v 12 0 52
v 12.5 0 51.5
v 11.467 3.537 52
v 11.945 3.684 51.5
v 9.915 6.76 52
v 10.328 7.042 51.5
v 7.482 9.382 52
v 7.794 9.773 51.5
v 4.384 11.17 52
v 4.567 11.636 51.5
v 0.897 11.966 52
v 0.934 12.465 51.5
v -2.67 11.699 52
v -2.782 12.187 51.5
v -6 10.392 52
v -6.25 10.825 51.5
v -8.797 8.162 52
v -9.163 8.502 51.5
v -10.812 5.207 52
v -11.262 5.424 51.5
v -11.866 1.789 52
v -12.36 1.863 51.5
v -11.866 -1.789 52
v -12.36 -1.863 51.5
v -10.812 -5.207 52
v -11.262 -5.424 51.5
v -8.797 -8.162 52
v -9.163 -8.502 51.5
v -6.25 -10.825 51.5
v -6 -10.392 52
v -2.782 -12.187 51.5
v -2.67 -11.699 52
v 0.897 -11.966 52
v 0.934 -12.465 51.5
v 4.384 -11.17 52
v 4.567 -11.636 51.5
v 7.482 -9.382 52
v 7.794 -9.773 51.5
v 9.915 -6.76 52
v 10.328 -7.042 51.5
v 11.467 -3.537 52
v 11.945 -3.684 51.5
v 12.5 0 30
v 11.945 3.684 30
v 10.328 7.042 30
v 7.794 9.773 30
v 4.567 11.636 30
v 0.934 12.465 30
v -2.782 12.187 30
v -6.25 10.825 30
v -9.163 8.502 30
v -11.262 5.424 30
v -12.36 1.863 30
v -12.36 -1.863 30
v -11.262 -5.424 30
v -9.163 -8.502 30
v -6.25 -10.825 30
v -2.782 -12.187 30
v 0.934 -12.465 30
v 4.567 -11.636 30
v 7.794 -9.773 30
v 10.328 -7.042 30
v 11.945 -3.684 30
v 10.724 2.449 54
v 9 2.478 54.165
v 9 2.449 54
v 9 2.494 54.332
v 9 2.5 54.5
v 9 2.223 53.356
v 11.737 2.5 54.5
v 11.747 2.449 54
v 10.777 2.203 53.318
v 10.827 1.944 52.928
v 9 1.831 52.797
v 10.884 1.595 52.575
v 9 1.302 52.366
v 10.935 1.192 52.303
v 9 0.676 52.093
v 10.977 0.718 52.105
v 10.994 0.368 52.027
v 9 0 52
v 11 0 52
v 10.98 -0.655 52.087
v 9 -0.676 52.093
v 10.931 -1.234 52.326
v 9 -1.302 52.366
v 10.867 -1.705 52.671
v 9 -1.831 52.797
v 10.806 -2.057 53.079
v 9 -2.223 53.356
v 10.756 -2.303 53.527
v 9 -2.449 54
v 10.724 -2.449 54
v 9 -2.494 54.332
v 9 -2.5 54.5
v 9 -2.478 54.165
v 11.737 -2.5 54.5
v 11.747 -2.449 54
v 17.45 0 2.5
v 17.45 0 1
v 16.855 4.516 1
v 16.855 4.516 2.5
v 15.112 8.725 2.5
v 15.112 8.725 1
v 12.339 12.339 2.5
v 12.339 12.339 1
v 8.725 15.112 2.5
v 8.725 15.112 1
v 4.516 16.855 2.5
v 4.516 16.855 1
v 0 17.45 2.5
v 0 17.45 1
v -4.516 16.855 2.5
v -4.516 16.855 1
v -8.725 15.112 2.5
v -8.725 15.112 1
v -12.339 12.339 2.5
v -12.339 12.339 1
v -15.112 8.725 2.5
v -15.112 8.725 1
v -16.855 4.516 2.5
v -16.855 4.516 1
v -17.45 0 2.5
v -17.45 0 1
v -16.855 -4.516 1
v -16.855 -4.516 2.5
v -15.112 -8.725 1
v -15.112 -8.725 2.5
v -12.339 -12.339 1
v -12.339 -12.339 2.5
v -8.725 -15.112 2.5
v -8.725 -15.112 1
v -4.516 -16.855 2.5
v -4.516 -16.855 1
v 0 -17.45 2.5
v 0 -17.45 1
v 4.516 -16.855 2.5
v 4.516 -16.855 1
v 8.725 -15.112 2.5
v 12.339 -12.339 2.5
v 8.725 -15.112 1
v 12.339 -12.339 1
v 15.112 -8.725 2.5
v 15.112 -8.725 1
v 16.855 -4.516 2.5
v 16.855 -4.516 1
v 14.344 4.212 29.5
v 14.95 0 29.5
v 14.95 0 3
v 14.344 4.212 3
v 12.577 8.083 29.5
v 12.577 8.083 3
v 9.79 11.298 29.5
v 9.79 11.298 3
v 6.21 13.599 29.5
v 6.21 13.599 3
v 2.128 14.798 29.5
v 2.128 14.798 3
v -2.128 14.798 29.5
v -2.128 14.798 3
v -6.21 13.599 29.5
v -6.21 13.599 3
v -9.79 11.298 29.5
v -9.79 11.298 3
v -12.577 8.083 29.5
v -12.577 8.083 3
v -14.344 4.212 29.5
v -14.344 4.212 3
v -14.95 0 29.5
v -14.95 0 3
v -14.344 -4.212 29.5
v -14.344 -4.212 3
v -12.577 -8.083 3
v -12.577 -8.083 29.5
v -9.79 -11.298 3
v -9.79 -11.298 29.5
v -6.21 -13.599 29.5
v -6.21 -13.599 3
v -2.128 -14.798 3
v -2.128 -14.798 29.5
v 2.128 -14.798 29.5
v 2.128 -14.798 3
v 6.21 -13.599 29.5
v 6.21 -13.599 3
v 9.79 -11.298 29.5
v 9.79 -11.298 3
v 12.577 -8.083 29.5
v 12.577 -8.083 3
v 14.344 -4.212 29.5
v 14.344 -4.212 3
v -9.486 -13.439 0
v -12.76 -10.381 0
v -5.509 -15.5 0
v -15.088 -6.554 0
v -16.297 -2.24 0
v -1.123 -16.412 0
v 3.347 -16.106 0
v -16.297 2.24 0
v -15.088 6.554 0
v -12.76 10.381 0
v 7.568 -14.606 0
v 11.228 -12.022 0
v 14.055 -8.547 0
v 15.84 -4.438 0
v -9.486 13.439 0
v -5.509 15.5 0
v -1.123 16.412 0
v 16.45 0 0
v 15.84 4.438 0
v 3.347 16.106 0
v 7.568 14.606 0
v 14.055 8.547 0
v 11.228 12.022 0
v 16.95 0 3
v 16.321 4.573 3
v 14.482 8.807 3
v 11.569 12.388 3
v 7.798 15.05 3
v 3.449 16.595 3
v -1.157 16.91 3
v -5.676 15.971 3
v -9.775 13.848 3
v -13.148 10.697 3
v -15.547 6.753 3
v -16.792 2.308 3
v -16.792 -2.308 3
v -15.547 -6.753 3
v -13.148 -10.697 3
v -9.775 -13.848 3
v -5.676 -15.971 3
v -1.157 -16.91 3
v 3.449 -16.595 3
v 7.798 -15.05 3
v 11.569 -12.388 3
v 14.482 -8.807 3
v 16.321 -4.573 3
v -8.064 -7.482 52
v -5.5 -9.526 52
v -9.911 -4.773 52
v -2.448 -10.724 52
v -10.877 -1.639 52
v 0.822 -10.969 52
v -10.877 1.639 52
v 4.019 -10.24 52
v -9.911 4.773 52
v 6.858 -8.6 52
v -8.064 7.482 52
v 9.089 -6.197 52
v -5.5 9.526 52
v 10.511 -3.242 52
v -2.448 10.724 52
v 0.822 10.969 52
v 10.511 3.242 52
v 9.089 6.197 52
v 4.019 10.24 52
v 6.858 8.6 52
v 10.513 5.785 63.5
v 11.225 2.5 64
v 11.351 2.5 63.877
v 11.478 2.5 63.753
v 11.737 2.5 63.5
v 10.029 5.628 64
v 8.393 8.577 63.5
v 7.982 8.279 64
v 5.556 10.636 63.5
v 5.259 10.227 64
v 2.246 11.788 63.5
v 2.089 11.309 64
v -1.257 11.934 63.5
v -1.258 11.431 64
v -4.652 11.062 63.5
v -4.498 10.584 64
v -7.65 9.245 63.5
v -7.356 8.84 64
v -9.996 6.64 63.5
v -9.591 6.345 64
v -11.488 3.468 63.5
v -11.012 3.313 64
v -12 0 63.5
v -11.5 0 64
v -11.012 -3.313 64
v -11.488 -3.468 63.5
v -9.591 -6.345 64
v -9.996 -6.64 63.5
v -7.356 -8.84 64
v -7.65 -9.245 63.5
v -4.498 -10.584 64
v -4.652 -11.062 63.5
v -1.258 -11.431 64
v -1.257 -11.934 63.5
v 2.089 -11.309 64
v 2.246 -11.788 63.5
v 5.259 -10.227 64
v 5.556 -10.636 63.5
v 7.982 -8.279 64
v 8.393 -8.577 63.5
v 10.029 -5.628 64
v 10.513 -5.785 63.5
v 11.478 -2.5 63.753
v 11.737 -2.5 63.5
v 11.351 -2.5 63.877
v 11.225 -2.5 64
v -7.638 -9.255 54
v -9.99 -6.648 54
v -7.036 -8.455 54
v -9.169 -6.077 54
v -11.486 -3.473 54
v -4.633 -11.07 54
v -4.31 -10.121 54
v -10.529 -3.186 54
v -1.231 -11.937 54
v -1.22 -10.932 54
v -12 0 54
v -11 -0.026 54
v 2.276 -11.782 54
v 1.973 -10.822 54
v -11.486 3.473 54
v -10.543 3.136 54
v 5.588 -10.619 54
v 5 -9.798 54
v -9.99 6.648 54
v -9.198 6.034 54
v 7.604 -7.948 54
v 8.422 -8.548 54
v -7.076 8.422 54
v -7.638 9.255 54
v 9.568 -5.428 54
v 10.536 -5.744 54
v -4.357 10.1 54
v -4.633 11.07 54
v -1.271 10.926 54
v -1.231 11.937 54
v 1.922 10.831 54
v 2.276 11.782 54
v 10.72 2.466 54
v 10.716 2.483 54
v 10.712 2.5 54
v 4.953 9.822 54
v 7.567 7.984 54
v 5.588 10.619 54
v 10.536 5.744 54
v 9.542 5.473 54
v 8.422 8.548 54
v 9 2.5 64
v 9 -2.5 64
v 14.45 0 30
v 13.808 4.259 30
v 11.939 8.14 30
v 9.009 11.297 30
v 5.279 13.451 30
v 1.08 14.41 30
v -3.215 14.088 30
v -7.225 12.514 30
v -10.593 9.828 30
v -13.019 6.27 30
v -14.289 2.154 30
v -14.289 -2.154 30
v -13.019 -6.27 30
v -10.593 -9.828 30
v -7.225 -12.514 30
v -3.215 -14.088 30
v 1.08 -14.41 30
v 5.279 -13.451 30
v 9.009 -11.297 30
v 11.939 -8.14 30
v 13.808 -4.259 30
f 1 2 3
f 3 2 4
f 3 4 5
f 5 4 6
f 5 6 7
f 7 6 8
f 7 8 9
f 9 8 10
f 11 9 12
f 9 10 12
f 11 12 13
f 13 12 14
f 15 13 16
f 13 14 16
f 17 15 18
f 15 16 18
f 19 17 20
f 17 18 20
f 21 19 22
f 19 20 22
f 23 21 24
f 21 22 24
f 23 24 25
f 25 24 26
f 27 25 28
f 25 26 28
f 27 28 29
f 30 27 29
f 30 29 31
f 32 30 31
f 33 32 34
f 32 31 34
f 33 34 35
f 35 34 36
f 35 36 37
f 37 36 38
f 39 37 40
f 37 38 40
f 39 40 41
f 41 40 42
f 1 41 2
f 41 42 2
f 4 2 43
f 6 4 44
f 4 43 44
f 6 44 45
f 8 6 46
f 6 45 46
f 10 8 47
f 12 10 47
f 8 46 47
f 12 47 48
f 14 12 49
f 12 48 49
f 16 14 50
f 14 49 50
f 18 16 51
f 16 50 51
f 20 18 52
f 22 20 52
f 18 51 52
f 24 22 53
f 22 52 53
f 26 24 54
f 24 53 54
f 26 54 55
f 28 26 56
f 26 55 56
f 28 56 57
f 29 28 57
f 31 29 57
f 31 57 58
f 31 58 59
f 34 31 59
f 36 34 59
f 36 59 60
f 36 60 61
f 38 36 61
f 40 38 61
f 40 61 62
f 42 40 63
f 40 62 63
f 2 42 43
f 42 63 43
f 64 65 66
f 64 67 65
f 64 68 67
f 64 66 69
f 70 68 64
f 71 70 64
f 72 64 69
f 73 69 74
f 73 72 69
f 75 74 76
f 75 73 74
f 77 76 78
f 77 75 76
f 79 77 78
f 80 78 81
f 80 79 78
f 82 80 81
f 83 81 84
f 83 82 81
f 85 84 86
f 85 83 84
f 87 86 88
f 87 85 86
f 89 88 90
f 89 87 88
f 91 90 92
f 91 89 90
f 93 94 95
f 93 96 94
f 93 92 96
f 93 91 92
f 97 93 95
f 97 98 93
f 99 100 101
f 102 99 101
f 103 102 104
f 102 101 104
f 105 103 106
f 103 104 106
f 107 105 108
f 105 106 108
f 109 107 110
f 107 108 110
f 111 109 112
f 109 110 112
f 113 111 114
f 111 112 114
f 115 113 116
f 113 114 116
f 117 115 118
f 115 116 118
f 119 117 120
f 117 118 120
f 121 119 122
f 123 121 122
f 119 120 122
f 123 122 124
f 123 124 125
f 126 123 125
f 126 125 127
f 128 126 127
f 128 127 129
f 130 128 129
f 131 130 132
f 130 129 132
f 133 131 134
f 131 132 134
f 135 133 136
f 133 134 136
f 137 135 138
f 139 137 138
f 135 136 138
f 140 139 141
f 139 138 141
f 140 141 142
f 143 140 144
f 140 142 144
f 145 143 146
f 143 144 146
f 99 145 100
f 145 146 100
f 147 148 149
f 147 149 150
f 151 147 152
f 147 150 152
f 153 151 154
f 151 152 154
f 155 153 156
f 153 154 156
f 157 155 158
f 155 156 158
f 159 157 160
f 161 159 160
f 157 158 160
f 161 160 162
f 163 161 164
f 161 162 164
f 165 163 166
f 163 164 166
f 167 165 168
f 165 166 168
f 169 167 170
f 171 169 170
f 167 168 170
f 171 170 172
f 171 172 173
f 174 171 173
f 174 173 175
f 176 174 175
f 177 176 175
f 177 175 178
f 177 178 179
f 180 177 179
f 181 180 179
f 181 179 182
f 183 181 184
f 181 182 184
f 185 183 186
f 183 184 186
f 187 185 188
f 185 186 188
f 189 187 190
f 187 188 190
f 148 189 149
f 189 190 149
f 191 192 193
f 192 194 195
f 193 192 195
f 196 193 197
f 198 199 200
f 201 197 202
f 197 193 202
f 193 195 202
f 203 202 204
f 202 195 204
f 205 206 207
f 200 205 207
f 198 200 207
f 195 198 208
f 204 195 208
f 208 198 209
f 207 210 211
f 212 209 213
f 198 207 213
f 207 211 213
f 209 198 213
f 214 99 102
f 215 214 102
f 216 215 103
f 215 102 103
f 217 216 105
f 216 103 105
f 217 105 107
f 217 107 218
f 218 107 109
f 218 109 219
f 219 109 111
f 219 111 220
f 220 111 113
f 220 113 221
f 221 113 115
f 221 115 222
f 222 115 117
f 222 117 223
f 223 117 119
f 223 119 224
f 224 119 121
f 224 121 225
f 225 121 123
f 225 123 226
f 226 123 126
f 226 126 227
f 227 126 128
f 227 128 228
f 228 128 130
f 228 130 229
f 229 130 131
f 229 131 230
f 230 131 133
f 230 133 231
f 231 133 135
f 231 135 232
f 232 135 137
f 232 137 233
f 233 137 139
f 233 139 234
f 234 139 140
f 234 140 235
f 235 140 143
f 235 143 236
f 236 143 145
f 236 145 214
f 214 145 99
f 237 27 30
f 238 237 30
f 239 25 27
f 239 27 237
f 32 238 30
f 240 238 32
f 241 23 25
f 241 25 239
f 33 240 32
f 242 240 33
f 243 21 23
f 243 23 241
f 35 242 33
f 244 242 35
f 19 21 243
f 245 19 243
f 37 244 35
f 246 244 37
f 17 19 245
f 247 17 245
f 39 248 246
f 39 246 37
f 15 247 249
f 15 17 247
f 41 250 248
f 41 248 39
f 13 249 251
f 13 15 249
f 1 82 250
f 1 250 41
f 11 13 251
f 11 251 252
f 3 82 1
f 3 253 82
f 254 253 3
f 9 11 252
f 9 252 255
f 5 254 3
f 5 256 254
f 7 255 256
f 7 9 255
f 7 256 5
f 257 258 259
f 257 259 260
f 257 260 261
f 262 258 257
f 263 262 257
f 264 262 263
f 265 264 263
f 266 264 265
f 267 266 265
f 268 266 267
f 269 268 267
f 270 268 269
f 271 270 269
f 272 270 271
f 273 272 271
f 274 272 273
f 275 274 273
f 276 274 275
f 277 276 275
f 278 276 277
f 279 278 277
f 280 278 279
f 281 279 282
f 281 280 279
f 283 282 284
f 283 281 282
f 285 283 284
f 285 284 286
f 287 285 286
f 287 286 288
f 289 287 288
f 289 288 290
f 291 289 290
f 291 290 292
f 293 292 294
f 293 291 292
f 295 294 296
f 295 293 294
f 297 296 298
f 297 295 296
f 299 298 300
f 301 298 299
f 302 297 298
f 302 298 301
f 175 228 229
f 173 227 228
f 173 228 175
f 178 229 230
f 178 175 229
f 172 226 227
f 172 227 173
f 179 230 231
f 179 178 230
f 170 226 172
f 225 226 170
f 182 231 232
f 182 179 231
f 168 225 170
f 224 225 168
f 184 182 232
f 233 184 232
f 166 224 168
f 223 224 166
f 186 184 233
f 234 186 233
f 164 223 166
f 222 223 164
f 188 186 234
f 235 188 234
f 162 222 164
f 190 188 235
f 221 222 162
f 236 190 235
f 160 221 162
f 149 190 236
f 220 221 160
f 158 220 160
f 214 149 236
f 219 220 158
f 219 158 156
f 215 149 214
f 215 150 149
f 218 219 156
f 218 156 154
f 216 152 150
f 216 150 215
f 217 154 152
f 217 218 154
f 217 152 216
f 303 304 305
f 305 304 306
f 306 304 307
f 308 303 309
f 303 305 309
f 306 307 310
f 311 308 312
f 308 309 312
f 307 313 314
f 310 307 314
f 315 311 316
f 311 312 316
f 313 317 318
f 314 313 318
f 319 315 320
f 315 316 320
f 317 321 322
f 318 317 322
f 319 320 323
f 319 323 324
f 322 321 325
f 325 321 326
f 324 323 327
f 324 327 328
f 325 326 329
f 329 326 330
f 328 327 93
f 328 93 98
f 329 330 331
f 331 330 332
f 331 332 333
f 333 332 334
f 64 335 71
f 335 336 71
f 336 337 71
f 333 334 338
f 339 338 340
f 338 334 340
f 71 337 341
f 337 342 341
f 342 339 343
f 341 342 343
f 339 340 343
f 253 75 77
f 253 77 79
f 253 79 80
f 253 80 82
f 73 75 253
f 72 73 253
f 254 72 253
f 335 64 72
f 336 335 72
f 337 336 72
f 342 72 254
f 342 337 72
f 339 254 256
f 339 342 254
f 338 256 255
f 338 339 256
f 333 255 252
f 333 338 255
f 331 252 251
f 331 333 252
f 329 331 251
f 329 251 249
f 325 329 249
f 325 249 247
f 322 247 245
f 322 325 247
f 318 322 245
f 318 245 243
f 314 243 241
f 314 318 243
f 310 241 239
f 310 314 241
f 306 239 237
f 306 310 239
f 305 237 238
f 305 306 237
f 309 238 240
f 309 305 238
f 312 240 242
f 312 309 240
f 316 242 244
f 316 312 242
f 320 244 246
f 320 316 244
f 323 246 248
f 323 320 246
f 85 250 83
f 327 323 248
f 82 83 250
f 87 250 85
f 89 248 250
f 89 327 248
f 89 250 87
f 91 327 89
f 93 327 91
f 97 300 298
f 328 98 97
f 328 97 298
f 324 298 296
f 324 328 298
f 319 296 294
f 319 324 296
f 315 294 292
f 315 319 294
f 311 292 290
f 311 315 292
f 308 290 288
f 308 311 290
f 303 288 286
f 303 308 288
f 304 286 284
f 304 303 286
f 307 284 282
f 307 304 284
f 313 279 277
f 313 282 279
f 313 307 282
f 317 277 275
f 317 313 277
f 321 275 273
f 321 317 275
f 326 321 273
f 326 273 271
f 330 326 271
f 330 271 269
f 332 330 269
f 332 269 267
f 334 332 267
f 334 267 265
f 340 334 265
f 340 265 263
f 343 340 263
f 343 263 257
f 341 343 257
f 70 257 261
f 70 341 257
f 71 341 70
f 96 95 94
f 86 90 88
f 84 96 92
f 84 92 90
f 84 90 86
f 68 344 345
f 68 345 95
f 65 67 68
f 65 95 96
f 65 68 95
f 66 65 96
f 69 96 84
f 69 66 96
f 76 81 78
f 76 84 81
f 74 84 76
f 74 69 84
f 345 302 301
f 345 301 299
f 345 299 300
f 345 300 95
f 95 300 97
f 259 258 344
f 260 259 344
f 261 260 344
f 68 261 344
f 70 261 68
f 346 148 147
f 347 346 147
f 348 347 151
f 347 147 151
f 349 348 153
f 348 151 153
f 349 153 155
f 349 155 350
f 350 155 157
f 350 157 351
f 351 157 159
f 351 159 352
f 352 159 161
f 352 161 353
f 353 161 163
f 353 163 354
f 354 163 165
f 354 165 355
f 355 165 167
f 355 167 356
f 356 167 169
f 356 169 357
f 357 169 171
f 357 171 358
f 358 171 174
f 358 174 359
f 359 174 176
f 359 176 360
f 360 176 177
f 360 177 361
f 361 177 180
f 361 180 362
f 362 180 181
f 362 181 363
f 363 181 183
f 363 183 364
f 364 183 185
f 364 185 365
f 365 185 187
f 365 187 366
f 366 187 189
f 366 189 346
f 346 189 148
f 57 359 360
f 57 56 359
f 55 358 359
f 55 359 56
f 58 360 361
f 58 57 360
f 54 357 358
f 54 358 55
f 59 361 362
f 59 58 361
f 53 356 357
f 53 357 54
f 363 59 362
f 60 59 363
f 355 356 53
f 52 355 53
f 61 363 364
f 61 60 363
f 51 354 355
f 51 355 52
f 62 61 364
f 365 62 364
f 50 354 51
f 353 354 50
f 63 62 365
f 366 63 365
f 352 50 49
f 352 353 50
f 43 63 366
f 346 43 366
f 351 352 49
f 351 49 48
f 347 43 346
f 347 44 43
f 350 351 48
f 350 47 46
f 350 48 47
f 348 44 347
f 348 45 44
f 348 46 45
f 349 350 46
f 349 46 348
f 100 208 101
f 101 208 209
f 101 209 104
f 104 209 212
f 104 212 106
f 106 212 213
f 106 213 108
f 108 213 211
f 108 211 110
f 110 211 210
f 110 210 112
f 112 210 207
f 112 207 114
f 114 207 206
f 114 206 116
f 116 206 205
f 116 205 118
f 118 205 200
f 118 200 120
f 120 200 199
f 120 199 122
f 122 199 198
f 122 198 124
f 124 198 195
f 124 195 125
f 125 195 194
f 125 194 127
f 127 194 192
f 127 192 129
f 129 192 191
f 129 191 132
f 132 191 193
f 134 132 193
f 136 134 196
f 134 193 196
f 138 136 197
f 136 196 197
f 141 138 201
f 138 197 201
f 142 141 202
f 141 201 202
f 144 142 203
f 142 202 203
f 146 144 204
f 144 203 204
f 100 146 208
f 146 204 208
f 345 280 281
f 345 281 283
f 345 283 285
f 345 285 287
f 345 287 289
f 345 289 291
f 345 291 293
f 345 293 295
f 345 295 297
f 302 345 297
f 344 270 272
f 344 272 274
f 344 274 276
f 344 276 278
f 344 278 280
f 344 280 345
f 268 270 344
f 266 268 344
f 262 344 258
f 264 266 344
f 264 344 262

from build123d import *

# Parameters (mm, degrees)
SKETCH_1_R          = 17.45
EXTRUDE_1_DEPTH     = 3
SKETCH_2_R          = 14.95
EXTRUDE_2_DEPTH     = 27
SKETCH_4_R          = 12.5
EXTRUDE_3_DEPTH     = 22
SKETCH_5_R          = 12
EXTRUDE_4_DEPTH     = 12
CHAMFER_1_SIZE      = 0.5
SKETCH_6_W          = 1
SKETCH_6_H          = 2
CHAMFER_2_SIZE      = 0.5
CHAMFER_3_SIZE      = 1
SKETCH_7_W          = 12
SKETCH_7_H          = 5
CUT_EXTRUDE_1_DEPTH = 3
FILLET_1_R          = 2.5


with BuildPart() as part:
    # 草图1 → 拉伸1 (new body)
    with BuildSketch(Plane.XY):
        Circle(SKETCH_1_R)
    extrude(amount=EXTRUDE_1_DEPTH)

    # 草图2 → 拉伸2 (add)
    with BuildSketch(Plane.XY.offset(3)):
        Circle(SKETCH_2_R)
    extrude(amount=EXTRUDE_2_DEPTH)

    # 草图4 → 拉伸3 (add)
    with BuildSketch(Plane.XY.offset(30)):
        Circle(SKETCH_4_R)
    extrude(amount=EXTRUDE_3_DEPTH)

    # 草图5 → 拉伸4 (add)
    with BuildSketch(Plane.XY.offset(52)):
        Circle(SKETCH_5_R)
    extrude(amount=EXTRUDE_4_DEPTH)

    # 倒角1
    chamfer_1_edges = [part.edges().sort_by_distance(p)[0] for p in [
        (-12, 0, 64),
    ]]
    chamfer(chamfer_1_edges, length=CHAMFER_1_SIZE)

    # 草图6 → 切除-旋转1 (revolve, cut)
    with BuildSketch(Plane(origin=(0, 0, 0), x_dir=(1, 0, 0), z_dir=(0, 1, 0)), mode=Mode.PRIVATE) as cut_revolve_1_sk:
        with Locations((-11.5, -53)):
            Rectangle(SKETCH_6_W, SKETCH_6_H)
    revolve(cut_revolve_1_sk.sketch.rotate(Axis((0, 0, 52), (0, 0, -1)), 180), axis=Axis((0, 0, 52), (0, 0, -1)), mode=Mode.SUBTRACT)

    # 倒角2
    chamfer_2_edges = [part.edges().sort_by_distance(p)[0] for p in [
        (-12.5, 0, 52),
        (-17.45, 0, 3),
        (-14.95, 0, 30),
    ]]
    chamfer(chamfer_2_edges, length=CHAMFER_2_SIZE)

    # 倒角3
    chamfer_3_edges = [part.edges().sort_by_distance(p)[0] for p in [
        (-17.45, 0, 0),
    ]]
    chamfer(chamfer_3_edges, length=CHAMFER_3_SIZE)

    # 草图7 → 切除-拉伸1 (cut)
    with BuildSketch(Plane(origin=(12, 0, 0), x_dir=(0, 0, -1), z_dir=(1, 0, 0))):
        with Locations((-58, 0)):
            Rectangle(SKETCH_7_W, SKETCH_7_H)
    extrude(amount=-CUT_EXTRUDE_1_DEPTH, mode=Mode.SUBTRACT)

    # 圆角1
    # the kernel refuses this fillet: 2.5 mm, written as the material it adds along each edge
    with BuildSketch(Plane(origin=(16.962142643, -2.5, 52), x_dir=(0, 1, 0), z_dir=(-1, 0, 0))) as fillet_1_piece_1_section:
        with BuildLine():
            CenterArc((FILLET_1_R, -FILLET_1_R), FILLET_1_R, 90, 90)
            Line((0, -FILLET_1_R), (0, 0))
            Line((0, 0), (FILLET_1_R, 0))
        make_face()
    fillet_1_piece_1 = extrude(amount=14.212142643, mode=Mode.PRIVATE)
    fillet_1_piece_1 = fillet_1_piece_1 & Plane(origin=(0, 0, 54.124758418), x_dir=(1, 0, 0), z_dir=(0, 0, -1)) * Cylinder(12, 39, mode=Mode.PRIVATE)
    fillet_1_piece_1 = split(fillet_1_piece_1, bisect_by=Plane(origin=(11.227777132, -2.484876178, 54), z_dir=(0, 0, 1)), keep=Keep.TOP, mode=Mode.PRIVATE)
    add(fillet_1_piece_1)
    with BuildSketch(Plane(origin=(16.962142643, -2.5, 52), x_dir=(0, 1, 0), z_dir=(-1, 0, 0))) as fillet_1_piece_2_section:
        with BuildLine():
            CenterArc((FILLET_1_R, -FILLET_1_R), FILLET_1_R, 90, 90)
            Line((0, -FILLET_1_R), (0, 0))
            Line((0, 0), (FILLET_1_R, 0))
        make_face()
    fillet_1_piece_2 = extrude(amount=14.212142643, mode=Mode.PRIVATE)
    fillet_1_piece_2 = fillet_1_piece_2 & Plane(origin=(0, 0, 53.528388409), x_dir=(1, 0, 0), z_dir=(0, 0, 1)) * Cylinder(11, 39, mode=Mode.PRIVATE)
    add(fillet_1_piece_2)
    with BuildSketch(Plane(origin=(16.962142643, 2.5, 52), x_dir=(0, -1, 0), z_dir=(-1, 0, 0))) as fillet_1_piece_3_section:
        with BuildLine():
            CenterArc((FILLET_1_R, FILLET_1_R), FILLET_1_R, 180, 90)
            Line((0, FILLET_1_R), (0, 0))
            Line((0, 0), (FILLET_1_R, 0))
        make_face()
    fillet_1_piece_3 = extrude(amount=14.212142643, mode=Mode.PRIVATE)
    fillet_1_piece_3 = fillet_1_piece_3 & Plane(origin=(0, 0, 54.124758418), x_dir=(1, 0, 0), z_dir=(0, 0, -1)) * Cylinder(12, 39, mode=Mode.PRIVATE)
    fillet_1_piece_3 = split(fillet_1_piece_3, bisect_by=Plane(origin=(11.227777136, 2.484876178, 54), z_dir=(0, 0, 1)), keep=Keep.TOP, mode=Mode.PRIVATE)
    add(fillet_1_piece_3)
    with BuildSketch(Plane(origin=(16.962142643, 2.5, 52), x_dir=(0, -1, 0), z_dir=(-1, 0, 0))) as fillet_1_piece_4_section:
        with BuildLine():
            CenterArc((FILLET_1_R, FILLET_1_R), FILLET_1_R, 180, 90)
            Line((0, FILLET_1_R), (0, 0))
            Line((0, 0), (FILLET_1_R, 0))
        make_face()
    fillet_1_piece_4 = extrude(amount=14.212142643, mode=Mode.PRIVATE)
    fillet_1_piece_4 = fillet_1_piece_4 & Plane(origin=(0, 0, 53.5283884), x_dir=(1, 0, 0), z_dir=(0, 0, 1)) * Cylinder(11, 39, mode=Mode.PRIVATE)
    add(fillet_1_piece_4)


solid = part.part
